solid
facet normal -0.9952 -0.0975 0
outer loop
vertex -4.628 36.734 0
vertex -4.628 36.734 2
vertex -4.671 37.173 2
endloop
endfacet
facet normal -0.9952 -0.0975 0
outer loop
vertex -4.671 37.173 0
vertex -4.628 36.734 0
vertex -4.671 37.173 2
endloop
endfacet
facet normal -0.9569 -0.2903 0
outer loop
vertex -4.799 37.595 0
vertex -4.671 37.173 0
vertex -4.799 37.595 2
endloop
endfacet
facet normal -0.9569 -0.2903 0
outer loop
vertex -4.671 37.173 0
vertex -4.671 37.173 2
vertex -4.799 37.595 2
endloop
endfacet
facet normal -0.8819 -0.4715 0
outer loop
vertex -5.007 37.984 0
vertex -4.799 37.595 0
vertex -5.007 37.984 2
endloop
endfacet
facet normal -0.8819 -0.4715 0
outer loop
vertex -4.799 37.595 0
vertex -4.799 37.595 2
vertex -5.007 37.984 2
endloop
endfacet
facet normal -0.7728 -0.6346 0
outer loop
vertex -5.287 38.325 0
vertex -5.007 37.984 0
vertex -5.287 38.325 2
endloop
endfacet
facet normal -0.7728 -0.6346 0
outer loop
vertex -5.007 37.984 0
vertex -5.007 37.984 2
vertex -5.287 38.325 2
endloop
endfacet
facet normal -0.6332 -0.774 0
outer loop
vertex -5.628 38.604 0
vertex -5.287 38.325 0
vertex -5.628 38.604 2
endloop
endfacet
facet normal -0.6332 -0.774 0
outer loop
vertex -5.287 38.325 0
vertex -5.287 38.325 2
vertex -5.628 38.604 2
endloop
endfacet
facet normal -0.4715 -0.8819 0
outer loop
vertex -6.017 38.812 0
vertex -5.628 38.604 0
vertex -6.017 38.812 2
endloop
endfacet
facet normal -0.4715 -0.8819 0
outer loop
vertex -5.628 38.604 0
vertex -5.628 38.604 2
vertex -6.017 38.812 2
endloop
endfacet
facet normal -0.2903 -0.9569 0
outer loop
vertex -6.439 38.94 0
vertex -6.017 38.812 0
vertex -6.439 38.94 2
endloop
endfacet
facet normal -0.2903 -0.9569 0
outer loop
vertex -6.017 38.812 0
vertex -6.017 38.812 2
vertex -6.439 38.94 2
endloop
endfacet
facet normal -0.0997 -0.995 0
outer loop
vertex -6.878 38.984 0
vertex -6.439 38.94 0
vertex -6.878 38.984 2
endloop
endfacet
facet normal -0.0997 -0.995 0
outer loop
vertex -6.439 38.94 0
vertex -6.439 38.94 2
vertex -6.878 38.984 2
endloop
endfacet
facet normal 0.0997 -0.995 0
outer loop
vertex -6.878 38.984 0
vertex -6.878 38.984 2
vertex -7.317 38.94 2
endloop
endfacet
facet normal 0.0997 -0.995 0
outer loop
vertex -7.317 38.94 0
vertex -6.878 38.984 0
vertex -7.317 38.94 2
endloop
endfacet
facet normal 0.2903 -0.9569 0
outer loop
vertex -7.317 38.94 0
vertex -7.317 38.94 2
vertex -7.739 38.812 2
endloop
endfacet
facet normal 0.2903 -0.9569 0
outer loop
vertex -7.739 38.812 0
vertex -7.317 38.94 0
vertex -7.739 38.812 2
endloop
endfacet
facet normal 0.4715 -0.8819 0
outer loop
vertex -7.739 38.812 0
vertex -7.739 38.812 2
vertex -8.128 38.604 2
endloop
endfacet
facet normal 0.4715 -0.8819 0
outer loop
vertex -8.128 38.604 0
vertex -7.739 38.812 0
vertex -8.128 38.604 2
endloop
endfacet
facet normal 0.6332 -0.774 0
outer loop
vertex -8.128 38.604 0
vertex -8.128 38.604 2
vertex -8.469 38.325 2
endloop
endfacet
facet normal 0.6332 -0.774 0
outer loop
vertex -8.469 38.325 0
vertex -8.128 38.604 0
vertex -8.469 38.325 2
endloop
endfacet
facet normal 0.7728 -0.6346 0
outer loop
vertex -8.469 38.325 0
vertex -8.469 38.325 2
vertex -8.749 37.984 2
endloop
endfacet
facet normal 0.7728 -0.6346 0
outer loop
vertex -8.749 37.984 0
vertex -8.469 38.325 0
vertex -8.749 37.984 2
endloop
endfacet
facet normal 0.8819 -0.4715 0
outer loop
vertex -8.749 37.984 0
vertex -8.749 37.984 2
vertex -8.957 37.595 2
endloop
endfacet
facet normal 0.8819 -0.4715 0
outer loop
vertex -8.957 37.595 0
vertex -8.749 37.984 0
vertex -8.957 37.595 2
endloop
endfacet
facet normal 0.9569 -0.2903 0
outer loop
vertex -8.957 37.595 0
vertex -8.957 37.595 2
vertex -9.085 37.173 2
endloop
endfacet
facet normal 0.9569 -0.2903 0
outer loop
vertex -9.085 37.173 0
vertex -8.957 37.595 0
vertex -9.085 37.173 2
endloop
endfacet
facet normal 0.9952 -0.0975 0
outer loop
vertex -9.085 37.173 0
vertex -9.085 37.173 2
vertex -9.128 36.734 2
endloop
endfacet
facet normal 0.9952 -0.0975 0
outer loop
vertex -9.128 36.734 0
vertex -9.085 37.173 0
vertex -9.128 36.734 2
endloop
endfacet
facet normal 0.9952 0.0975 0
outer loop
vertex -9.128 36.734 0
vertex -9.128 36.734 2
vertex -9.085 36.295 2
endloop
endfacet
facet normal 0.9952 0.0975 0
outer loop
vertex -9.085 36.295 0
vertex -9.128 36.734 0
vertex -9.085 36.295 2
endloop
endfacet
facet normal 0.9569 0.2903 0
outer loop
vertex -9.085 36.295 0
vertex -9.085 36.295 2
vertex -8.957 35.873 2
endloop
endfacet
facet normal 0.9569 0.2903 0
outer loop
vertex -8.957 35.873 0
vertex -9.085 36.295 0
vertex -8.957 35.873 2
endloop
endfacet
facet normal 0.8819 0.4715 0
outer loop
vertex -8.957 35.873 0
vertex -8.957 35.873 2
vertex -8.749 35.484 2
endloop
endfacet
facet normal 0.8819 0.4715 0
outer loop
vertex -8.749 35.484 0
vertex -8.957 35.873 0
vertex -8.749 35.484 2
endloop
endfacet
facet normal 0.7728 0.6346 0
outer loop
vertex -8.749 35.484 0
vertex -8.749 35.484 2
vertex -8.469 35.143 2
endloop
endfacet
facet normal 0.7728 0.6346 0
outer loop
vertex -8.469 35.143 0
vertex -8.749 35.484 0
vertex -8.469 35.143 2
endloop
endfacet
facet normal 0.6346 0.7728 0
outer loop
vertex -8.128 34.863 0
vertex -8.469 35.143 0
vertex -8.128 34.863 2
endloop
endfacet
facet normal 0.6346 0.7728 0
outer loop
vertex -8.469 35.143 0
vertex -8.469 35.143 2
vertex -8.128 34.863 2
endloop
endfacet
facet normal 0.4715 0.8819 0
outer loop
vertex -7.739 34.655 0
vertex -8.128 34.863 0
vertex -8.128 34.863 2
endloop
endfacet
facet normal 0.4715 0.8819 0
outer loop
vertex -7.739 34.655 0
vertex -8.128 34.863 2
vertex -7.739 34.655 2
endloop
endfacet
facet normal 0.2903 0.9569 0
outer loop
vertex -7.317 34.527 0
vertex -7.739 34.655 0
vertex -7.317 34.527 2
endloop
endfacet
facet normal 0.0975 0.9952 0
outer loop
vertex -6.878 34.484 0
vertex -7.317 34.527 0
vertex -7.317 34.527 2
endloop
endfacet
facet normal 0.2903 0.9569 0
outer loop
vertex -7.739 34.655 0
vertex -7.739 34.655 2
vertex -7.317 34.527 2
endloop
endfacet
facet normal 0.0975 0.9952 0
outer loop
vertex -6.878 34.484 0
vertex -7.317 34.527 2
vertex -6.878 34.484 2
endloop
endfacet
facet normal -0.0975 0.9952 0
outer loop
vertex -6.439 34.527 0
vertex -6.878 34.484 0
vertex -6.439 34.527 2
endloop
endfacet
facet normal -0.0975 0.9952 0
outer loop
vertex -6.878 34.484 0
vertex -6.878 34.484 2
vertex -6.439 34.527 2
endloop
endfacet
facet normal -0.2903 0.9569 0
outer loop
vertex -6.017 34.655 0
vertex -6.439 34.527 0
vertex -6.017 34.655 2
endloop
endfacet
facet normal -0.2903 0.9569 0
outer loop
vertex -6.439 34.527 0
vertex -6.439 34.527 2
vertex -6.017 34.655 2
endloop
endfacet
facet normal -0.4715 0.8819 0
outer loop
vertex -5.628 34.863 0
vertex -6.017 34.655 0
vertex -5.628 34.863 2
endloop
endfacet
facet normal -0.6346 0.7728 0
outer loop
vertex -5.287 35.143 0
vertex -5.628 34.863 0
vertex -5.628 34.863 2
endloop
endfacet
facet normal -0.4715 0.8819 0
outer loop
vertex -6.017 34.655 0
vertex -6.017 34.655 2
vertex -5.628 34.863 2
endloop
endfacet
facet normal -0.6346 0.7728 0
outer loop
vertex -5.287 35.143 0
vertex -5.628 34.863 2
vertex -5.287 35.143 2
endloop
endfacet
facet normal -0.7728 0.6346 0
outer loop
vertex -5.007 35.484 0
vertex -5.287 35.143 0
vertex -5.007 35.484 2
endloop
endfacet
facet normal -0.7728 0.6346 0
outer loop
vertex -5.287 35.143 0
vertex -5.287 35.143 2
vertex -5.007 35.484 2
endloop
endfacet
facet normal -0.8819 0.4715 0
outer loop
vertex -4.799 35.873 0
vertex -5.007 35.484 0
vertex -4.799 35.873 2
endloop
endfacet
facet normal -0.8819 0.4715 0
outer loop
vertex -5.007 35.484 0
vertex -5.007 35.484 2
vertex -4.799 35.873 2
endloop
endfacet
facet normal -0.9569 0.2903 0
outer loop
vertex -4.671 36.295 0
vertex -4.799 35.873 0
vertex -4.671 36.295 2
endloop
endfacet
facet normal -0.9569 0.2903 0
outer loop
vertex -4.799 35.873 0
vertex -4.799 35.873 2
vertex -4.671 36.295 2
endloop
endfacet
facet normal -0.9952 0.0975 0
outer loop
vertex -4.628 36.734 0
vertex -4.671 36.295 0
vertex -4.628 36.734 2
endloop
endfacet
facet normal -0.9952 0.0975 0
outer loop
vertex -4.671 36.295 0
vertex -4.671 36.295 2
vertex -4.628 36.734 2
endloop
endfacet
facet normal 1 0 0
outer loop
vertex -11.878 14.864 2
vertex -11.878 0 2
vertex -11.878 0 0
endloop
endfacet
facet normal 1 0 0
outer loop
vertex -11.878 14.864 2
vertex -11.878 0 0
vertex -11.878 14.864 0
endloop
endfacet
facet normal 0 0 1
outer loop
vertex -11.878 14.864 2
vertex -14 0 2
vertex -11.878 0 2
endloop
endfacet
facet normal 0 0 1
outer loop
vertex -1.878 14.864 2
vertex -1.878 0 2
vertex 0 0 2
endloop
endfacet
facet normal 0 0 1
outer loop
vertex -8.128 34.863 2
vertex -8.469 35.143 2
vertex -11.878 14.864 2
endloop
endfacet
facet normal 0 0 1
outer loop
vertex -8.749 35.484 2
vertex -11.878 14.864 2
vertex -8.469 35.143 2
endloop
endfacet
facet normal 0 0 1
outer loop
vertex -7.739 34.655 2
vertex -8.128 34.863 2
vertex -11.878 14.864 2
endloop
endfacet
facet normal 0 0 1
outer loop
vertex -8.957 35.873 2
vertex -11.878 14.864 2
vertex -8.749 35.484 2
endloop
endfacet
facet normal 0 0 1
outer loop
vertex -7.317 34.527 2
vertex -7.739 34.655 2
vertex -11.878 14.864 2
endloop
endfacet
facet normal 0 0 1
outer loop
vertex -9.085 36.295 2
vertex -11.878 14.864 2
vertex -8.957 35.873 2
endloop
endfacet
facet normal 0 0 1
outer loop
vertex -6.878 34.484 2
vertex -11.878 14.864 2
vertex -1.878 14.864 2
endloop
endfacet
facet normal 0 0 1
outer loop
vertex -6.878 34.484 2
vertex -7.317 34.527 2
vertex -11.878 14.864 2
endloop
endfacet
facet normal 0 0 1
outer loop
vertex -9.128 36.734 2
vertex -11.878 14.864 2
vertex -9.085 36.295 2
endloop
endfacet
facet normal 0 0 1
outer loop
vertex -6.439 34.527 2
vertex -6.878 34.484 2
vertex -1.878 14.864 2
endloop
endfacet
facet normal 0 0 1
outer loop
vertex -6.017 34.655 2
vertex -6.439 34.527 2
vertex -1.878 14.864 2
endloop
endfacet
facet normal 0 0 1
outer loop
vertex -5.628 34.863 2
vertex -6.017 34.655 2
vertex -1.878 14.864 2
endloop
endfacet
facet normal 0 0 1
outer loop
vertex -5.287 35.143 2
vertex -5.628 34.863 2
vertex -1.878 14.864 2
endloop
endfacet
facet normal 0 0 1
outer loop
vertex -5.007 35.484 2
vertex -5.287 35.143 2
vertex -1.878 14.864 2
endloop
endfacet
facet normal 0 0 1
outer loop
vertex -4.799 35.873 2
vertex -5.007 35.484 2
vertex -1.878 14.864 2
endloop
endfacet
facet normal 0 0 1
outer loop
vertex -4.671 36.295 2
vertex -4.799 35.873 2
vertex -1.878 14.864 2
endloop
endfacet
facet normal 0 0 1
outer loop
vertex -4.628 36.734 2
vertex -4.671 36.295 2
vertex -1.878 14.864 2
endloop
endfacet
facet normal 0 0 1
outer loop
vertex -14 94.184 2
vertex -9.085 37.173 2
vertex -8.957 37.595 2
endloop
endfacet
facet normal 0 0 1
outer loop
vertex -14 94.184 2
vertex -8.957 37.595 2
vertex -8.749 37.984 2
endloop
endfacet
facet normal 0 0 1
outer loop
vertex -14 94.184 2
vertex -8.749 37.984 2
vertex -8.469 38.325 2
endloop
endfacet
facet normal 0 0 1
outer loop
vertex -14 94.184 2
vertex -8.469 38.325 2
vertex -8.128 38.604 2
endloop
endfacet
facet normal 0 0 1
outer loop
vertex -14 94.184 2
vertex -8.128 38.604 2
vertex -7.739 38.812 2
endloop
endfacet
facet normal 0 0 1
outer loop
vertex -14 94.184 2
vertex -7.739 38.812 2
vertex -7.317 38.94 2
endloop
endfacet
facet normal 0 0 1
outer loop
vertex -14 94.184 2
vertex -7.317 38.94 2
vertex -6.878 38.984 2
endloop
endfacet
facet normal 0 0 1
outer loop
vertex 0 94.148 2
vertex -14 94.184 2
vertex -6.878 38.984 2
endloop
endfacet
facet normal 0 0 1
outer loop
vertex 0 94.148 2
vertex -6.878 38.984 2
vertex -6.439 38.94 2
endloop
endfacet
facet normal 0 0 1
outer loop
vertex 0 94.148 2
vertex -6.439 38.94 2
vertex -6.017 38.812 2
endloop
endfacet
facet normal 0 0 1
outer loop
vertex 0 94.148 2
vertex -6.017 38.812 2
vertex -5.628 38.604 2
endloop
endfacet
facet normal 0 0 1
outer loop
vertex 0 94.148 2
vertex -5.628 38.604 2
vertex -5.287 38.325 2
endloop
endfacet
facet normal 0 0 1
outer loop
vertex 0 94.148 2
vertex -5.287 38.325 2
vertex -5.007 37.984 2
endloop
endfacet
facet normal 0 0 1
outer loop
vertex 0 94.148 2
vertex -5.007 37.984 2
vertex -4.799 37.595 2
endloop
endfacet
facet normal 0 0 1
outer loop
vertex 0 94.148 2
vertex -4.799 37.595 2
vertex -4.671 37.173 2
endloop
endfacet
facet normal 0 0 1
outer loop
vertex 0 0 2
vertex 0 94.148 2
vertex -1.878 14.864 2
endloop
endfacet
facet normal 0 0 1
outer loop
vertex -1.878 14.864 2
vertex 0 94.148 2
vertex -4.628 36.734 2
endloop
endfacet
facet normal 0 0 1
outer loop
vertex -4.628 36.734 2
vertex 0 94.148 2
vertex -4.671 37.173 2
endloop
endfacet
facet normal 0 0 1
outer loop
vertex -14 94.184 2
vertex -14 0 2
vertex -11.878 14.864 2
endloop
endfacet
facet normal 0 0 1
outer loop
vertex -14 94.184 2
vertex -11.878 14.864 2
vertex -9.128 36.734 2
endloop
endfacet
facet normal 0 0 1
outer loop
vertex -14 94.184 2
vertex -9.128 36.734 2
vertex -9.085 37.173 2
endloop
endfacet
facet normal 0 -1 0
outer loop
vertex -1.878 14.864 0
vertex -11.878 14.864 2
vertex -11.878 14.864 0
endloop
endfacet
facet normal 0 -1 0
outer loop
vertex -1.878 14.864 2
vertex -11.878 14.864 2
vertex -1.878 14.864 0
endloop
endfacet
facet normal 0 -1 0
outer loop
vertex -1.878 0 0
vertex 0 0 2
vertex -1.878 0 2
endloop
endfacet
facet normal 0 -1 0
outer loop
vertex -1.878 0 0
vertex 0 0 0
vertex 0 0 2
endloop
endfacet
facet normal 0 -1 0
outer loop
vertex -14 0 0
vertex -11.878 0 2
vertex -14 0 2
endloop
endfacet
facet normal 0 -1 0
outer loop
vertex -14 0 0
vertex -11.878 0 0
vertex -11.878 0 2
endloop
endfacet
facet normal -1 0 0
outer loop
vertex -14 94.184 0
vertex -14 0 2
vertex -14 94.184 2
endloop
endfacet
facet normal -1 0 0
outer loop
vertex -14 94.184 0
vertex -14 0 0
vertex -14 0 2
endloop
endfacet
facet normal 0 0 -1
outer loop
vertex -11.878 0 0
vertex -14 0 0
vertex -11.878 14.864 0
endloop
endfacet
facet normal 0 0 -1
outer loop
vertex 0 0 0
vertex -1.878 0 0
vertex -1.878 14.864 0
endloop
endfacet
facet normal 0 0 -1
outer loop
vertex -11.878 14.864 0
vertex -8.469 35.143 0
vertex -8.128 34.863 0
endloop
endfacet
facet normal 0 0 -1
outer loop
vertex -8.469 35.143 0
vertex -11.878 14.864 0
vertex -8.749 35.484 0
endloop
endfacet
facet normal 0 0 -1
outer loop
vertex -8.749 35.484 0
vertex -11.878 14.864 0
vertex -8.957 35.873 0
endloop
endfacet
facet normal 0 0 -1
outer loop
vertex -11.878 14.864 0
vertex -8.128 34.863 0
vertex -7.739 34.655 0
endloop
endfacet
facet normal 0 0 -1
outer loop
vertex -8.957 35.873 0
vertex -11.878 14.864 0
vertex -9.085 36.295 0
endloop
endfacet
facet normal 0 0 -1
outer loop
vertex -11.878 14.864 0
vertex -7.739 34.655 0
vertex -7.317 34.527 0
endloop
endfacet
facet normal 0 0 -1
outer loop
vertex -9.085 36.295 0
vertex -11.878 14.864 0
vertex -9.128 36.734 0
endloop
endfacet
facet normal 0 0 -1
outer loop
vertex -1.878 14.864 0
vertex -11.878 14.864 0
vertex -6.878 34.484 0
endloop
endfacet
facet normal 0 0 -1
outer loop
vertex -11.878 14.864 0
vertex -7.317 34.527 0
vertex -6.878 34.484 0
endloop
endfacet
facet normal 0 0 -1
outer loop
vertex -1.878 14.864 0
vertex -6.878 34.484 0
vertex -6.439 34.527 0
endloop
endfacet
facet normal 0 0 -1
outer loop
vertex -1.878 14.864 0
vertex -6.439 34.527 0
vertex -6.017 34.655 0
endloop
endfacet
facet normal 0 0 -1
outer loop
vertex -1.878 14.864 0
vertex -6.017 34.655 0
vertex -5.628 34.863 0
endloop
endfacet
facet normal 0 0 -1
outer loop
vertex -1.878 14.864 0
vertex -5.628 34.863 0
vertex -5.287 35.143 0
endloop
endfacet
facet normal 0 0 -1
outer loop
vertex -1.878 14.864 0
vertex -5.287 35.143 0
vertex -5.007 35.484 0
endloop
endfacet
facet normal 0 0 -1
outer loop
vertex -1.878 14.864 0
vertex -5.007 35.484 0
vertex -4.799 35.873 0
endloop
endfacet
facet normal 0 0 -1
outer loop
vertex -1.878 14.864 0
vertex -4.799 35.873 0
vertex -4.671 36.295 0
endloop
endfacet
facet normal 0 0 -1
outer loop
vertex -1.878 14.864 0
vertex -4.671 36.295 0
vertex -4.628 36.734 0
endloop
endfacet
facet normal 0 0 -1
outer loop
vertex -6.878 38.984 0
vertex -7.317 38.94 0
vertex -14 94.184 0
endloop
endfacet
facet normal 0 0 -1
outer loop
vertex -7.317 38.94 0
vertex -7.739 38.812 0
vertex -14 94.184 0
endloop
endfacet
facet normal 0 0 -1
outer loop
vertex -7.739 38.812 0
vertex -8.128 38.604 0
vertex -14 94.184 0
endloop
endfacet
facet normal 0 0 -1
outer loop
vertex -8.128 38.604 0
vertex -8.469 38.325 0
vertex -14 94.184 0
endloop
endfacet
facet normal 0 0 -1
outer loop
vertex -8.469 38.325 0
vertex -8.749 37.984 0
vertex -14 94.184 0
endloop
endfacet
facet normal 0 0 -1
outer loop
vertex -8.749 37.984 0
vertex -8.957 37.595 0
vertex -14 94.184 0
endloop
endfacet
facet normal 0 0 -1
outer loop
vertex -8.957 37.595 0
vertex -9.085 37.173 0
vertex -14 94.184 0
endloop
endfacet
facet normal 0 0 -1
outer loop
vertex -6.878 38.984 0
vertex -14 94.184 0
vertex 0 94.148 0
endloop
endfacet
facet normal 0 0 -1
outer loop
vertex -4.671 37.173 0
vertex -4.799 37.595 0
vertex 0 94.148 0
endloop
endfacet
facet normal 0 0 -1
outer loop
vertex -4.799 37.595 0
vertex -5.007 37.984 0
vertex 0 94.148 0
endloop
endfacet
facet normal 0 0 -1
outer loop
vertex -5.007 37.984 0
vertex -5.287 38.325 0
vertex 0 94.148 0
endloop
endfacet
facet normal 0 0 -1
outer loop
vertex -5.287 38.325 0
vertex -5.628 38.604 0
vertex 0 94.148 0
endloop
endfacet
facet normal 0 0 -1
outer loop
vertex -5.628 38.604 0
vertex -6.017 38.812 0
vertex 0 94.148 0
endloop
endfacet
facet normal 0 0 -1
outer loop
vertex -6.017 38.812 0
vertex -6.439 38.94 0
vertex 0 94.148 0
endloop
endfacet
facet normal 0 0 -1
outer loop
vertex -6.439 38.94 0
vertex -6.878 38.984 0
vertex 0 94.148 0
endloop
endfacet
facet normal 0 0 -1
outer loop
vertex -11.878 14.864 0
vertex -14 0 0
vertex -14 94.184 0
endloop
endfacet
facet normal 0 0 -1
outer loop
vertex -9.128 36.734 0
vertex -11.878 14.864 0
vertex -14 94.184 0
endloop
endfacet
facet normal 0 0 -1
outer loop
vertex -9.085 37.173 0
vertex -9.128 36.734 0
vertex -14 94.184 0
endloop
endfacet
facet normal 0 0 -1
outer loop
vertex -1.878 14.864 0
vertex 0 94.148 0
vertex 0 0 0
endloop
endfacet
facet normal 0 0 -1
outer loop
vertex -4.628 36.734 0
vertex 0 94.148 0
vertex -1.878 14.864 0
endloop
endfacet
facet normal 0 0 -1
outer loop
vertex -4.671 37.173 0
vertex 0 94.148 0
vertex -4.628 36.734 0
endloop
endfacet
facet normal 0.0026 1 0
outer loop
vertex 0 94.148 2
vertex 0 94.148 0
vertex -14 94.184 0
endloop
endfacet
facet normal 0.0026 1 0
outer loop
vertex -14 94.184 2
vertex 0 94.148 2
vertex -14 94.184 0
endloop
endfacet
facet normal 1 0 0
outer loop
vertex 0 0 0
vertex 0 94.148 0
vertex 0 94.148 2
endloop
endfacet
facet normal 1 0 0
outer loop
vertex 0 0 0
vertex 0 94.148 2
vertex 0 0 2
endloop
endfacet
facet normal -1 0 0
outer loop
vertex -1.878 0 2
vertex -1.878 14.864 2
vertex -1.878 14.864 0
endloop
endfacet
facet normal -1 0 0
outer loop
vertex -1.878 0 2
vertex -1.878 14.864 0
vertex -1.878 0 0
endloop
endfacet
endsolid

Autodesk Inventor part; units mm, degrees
ref_plane "YZ Plane" through (0, 0, 0) normal (1, 0, 0) x (0, 1, 0)
ref_plane "XZ Plane" through (0, 0, 0) normal (0, 1, 0) x (-1, 0, 0)
ref_plane "XY Plane" through (0, 0, 0) normal (0, 0, 1) x (1, 0, 0)
sketch "Sketch1" plane through (0, 0, 0) normal (0, 0, 1) x (1, 0, 0)
  line L0 (0, 94.1479) -> (-14, 94.1843) projected
  line L1 (0, 0) -> (-14, 0)
  line L2 (-14, 0) -> (-14, 94.1843)
  line L3 (-14, 94.1843) -> (0, 94.1843)
  line L4 (0, 94.1843) -> (0, 0)
  line L5 (-14, 94.1843) -> (0, 94.1843)
  line L6 (0, 94.1843) -> (0, 114.1843)
  line L7 (0, 114.1843) -> (-14, 114.1843)
  line L8 (-14, 114.1843) -> (-14, 94.1843)
  line L9 (0, 0) -> (0, -4)
  line L10 (0, -4) -> (-14, -4)
  line L11 (-14, 0) -> (-14, -4)
  point P0 (0, 88.7812)
  point P1 (0, 94.1479)
  dimension "d0" = 20
  dimension "d7" = 4
extrude "Extrusion1" add sketch "Sketch1" along normal blind 2 contours L4 L1 L2 L0
sketch "Sketch2" plane through (0, 0, 2) normal (0, 0, 1) x (1, 0, 0)
  circle A0 centre (-5.7096, 36.7123) radius 6.15 projected
  circle A1 centre (-5.7096, 36.7123) radius 2.15 projected
  circle A2 centre (-6.8781, 4.5836) radius 17.5 projected
  circle A3 centre (-6.8781, 4.5836) radius 5 projected
  circle A4 centre (-6.8781, 4.5836) radius 32.15
  circle A5 centre (-6.8781, 36.7336) radius 2.25
  line L0 (-6.8781, 4.5836) -> (-6.8781, 17.8952) construction
  line L1 (-6.8781, 36.7336) -> (-6.8781, 4.5836) construction
  line L2 (-11.8781, -0.9531) -> (-11.8781, 14.8638)
  line L3 (-11.8781, 14.8638) -> (-1.8781, 14.8638)
  line L4 (-1.8781, 14.8638) -> (-1.8781, -0.9531)
  line L5 (-1.8781, -0.9531) -> (-11.8781, -0.9531)
  arc A6 (-11.8781, -0.4164) -> (-1.8781, -0.4164) centre (-6.8781, -0.4164) ccw projected
  point P0 (0, 0)
  point P1 (-1.8781, 4.5836)
  point P2 (-11.8781, 4.5836)
  dimension "d3" = 4.5
  dimension "d4" = 0
extrude "Extrusion2" cut sketch "Sketch2" against normal through all contours A5 A1 A4 | A4 A1 A5 | A4 A5 A1 | A1 A5 A4 | A3 | L4 A6 L5 L2 A3 | A3 L2 L3 L4 | L4 L5 A6 | A6 L5 L2 picked at (-8.3259, 37.2162) picked at (-8.3126, 36.1952) picked at (-6.3657, 36.0685) picked at (-6.3452, 37.3793)
equation "\"BendRadius\" = Thickness"
equation "\"BendReliefWidth\" = Thickness"
equation "\"BendReliefDepth\" = 0.5 * Thickness"
equation "\"CornerReliefSize\" = 4 * Thickness"
equation "\"MinimumRemnant\" = 2 * Thickness"
equation "\"TransitionRadius\" = BendRadius"
equation "\"JacobiRadiusSize\" = BendRadius"
equation "\"GapSize\" = Thickness"
equation "\"Thickness\" = 2"
properties part number "backWheelNoMotor brake mount" material "Steel, Mild"
